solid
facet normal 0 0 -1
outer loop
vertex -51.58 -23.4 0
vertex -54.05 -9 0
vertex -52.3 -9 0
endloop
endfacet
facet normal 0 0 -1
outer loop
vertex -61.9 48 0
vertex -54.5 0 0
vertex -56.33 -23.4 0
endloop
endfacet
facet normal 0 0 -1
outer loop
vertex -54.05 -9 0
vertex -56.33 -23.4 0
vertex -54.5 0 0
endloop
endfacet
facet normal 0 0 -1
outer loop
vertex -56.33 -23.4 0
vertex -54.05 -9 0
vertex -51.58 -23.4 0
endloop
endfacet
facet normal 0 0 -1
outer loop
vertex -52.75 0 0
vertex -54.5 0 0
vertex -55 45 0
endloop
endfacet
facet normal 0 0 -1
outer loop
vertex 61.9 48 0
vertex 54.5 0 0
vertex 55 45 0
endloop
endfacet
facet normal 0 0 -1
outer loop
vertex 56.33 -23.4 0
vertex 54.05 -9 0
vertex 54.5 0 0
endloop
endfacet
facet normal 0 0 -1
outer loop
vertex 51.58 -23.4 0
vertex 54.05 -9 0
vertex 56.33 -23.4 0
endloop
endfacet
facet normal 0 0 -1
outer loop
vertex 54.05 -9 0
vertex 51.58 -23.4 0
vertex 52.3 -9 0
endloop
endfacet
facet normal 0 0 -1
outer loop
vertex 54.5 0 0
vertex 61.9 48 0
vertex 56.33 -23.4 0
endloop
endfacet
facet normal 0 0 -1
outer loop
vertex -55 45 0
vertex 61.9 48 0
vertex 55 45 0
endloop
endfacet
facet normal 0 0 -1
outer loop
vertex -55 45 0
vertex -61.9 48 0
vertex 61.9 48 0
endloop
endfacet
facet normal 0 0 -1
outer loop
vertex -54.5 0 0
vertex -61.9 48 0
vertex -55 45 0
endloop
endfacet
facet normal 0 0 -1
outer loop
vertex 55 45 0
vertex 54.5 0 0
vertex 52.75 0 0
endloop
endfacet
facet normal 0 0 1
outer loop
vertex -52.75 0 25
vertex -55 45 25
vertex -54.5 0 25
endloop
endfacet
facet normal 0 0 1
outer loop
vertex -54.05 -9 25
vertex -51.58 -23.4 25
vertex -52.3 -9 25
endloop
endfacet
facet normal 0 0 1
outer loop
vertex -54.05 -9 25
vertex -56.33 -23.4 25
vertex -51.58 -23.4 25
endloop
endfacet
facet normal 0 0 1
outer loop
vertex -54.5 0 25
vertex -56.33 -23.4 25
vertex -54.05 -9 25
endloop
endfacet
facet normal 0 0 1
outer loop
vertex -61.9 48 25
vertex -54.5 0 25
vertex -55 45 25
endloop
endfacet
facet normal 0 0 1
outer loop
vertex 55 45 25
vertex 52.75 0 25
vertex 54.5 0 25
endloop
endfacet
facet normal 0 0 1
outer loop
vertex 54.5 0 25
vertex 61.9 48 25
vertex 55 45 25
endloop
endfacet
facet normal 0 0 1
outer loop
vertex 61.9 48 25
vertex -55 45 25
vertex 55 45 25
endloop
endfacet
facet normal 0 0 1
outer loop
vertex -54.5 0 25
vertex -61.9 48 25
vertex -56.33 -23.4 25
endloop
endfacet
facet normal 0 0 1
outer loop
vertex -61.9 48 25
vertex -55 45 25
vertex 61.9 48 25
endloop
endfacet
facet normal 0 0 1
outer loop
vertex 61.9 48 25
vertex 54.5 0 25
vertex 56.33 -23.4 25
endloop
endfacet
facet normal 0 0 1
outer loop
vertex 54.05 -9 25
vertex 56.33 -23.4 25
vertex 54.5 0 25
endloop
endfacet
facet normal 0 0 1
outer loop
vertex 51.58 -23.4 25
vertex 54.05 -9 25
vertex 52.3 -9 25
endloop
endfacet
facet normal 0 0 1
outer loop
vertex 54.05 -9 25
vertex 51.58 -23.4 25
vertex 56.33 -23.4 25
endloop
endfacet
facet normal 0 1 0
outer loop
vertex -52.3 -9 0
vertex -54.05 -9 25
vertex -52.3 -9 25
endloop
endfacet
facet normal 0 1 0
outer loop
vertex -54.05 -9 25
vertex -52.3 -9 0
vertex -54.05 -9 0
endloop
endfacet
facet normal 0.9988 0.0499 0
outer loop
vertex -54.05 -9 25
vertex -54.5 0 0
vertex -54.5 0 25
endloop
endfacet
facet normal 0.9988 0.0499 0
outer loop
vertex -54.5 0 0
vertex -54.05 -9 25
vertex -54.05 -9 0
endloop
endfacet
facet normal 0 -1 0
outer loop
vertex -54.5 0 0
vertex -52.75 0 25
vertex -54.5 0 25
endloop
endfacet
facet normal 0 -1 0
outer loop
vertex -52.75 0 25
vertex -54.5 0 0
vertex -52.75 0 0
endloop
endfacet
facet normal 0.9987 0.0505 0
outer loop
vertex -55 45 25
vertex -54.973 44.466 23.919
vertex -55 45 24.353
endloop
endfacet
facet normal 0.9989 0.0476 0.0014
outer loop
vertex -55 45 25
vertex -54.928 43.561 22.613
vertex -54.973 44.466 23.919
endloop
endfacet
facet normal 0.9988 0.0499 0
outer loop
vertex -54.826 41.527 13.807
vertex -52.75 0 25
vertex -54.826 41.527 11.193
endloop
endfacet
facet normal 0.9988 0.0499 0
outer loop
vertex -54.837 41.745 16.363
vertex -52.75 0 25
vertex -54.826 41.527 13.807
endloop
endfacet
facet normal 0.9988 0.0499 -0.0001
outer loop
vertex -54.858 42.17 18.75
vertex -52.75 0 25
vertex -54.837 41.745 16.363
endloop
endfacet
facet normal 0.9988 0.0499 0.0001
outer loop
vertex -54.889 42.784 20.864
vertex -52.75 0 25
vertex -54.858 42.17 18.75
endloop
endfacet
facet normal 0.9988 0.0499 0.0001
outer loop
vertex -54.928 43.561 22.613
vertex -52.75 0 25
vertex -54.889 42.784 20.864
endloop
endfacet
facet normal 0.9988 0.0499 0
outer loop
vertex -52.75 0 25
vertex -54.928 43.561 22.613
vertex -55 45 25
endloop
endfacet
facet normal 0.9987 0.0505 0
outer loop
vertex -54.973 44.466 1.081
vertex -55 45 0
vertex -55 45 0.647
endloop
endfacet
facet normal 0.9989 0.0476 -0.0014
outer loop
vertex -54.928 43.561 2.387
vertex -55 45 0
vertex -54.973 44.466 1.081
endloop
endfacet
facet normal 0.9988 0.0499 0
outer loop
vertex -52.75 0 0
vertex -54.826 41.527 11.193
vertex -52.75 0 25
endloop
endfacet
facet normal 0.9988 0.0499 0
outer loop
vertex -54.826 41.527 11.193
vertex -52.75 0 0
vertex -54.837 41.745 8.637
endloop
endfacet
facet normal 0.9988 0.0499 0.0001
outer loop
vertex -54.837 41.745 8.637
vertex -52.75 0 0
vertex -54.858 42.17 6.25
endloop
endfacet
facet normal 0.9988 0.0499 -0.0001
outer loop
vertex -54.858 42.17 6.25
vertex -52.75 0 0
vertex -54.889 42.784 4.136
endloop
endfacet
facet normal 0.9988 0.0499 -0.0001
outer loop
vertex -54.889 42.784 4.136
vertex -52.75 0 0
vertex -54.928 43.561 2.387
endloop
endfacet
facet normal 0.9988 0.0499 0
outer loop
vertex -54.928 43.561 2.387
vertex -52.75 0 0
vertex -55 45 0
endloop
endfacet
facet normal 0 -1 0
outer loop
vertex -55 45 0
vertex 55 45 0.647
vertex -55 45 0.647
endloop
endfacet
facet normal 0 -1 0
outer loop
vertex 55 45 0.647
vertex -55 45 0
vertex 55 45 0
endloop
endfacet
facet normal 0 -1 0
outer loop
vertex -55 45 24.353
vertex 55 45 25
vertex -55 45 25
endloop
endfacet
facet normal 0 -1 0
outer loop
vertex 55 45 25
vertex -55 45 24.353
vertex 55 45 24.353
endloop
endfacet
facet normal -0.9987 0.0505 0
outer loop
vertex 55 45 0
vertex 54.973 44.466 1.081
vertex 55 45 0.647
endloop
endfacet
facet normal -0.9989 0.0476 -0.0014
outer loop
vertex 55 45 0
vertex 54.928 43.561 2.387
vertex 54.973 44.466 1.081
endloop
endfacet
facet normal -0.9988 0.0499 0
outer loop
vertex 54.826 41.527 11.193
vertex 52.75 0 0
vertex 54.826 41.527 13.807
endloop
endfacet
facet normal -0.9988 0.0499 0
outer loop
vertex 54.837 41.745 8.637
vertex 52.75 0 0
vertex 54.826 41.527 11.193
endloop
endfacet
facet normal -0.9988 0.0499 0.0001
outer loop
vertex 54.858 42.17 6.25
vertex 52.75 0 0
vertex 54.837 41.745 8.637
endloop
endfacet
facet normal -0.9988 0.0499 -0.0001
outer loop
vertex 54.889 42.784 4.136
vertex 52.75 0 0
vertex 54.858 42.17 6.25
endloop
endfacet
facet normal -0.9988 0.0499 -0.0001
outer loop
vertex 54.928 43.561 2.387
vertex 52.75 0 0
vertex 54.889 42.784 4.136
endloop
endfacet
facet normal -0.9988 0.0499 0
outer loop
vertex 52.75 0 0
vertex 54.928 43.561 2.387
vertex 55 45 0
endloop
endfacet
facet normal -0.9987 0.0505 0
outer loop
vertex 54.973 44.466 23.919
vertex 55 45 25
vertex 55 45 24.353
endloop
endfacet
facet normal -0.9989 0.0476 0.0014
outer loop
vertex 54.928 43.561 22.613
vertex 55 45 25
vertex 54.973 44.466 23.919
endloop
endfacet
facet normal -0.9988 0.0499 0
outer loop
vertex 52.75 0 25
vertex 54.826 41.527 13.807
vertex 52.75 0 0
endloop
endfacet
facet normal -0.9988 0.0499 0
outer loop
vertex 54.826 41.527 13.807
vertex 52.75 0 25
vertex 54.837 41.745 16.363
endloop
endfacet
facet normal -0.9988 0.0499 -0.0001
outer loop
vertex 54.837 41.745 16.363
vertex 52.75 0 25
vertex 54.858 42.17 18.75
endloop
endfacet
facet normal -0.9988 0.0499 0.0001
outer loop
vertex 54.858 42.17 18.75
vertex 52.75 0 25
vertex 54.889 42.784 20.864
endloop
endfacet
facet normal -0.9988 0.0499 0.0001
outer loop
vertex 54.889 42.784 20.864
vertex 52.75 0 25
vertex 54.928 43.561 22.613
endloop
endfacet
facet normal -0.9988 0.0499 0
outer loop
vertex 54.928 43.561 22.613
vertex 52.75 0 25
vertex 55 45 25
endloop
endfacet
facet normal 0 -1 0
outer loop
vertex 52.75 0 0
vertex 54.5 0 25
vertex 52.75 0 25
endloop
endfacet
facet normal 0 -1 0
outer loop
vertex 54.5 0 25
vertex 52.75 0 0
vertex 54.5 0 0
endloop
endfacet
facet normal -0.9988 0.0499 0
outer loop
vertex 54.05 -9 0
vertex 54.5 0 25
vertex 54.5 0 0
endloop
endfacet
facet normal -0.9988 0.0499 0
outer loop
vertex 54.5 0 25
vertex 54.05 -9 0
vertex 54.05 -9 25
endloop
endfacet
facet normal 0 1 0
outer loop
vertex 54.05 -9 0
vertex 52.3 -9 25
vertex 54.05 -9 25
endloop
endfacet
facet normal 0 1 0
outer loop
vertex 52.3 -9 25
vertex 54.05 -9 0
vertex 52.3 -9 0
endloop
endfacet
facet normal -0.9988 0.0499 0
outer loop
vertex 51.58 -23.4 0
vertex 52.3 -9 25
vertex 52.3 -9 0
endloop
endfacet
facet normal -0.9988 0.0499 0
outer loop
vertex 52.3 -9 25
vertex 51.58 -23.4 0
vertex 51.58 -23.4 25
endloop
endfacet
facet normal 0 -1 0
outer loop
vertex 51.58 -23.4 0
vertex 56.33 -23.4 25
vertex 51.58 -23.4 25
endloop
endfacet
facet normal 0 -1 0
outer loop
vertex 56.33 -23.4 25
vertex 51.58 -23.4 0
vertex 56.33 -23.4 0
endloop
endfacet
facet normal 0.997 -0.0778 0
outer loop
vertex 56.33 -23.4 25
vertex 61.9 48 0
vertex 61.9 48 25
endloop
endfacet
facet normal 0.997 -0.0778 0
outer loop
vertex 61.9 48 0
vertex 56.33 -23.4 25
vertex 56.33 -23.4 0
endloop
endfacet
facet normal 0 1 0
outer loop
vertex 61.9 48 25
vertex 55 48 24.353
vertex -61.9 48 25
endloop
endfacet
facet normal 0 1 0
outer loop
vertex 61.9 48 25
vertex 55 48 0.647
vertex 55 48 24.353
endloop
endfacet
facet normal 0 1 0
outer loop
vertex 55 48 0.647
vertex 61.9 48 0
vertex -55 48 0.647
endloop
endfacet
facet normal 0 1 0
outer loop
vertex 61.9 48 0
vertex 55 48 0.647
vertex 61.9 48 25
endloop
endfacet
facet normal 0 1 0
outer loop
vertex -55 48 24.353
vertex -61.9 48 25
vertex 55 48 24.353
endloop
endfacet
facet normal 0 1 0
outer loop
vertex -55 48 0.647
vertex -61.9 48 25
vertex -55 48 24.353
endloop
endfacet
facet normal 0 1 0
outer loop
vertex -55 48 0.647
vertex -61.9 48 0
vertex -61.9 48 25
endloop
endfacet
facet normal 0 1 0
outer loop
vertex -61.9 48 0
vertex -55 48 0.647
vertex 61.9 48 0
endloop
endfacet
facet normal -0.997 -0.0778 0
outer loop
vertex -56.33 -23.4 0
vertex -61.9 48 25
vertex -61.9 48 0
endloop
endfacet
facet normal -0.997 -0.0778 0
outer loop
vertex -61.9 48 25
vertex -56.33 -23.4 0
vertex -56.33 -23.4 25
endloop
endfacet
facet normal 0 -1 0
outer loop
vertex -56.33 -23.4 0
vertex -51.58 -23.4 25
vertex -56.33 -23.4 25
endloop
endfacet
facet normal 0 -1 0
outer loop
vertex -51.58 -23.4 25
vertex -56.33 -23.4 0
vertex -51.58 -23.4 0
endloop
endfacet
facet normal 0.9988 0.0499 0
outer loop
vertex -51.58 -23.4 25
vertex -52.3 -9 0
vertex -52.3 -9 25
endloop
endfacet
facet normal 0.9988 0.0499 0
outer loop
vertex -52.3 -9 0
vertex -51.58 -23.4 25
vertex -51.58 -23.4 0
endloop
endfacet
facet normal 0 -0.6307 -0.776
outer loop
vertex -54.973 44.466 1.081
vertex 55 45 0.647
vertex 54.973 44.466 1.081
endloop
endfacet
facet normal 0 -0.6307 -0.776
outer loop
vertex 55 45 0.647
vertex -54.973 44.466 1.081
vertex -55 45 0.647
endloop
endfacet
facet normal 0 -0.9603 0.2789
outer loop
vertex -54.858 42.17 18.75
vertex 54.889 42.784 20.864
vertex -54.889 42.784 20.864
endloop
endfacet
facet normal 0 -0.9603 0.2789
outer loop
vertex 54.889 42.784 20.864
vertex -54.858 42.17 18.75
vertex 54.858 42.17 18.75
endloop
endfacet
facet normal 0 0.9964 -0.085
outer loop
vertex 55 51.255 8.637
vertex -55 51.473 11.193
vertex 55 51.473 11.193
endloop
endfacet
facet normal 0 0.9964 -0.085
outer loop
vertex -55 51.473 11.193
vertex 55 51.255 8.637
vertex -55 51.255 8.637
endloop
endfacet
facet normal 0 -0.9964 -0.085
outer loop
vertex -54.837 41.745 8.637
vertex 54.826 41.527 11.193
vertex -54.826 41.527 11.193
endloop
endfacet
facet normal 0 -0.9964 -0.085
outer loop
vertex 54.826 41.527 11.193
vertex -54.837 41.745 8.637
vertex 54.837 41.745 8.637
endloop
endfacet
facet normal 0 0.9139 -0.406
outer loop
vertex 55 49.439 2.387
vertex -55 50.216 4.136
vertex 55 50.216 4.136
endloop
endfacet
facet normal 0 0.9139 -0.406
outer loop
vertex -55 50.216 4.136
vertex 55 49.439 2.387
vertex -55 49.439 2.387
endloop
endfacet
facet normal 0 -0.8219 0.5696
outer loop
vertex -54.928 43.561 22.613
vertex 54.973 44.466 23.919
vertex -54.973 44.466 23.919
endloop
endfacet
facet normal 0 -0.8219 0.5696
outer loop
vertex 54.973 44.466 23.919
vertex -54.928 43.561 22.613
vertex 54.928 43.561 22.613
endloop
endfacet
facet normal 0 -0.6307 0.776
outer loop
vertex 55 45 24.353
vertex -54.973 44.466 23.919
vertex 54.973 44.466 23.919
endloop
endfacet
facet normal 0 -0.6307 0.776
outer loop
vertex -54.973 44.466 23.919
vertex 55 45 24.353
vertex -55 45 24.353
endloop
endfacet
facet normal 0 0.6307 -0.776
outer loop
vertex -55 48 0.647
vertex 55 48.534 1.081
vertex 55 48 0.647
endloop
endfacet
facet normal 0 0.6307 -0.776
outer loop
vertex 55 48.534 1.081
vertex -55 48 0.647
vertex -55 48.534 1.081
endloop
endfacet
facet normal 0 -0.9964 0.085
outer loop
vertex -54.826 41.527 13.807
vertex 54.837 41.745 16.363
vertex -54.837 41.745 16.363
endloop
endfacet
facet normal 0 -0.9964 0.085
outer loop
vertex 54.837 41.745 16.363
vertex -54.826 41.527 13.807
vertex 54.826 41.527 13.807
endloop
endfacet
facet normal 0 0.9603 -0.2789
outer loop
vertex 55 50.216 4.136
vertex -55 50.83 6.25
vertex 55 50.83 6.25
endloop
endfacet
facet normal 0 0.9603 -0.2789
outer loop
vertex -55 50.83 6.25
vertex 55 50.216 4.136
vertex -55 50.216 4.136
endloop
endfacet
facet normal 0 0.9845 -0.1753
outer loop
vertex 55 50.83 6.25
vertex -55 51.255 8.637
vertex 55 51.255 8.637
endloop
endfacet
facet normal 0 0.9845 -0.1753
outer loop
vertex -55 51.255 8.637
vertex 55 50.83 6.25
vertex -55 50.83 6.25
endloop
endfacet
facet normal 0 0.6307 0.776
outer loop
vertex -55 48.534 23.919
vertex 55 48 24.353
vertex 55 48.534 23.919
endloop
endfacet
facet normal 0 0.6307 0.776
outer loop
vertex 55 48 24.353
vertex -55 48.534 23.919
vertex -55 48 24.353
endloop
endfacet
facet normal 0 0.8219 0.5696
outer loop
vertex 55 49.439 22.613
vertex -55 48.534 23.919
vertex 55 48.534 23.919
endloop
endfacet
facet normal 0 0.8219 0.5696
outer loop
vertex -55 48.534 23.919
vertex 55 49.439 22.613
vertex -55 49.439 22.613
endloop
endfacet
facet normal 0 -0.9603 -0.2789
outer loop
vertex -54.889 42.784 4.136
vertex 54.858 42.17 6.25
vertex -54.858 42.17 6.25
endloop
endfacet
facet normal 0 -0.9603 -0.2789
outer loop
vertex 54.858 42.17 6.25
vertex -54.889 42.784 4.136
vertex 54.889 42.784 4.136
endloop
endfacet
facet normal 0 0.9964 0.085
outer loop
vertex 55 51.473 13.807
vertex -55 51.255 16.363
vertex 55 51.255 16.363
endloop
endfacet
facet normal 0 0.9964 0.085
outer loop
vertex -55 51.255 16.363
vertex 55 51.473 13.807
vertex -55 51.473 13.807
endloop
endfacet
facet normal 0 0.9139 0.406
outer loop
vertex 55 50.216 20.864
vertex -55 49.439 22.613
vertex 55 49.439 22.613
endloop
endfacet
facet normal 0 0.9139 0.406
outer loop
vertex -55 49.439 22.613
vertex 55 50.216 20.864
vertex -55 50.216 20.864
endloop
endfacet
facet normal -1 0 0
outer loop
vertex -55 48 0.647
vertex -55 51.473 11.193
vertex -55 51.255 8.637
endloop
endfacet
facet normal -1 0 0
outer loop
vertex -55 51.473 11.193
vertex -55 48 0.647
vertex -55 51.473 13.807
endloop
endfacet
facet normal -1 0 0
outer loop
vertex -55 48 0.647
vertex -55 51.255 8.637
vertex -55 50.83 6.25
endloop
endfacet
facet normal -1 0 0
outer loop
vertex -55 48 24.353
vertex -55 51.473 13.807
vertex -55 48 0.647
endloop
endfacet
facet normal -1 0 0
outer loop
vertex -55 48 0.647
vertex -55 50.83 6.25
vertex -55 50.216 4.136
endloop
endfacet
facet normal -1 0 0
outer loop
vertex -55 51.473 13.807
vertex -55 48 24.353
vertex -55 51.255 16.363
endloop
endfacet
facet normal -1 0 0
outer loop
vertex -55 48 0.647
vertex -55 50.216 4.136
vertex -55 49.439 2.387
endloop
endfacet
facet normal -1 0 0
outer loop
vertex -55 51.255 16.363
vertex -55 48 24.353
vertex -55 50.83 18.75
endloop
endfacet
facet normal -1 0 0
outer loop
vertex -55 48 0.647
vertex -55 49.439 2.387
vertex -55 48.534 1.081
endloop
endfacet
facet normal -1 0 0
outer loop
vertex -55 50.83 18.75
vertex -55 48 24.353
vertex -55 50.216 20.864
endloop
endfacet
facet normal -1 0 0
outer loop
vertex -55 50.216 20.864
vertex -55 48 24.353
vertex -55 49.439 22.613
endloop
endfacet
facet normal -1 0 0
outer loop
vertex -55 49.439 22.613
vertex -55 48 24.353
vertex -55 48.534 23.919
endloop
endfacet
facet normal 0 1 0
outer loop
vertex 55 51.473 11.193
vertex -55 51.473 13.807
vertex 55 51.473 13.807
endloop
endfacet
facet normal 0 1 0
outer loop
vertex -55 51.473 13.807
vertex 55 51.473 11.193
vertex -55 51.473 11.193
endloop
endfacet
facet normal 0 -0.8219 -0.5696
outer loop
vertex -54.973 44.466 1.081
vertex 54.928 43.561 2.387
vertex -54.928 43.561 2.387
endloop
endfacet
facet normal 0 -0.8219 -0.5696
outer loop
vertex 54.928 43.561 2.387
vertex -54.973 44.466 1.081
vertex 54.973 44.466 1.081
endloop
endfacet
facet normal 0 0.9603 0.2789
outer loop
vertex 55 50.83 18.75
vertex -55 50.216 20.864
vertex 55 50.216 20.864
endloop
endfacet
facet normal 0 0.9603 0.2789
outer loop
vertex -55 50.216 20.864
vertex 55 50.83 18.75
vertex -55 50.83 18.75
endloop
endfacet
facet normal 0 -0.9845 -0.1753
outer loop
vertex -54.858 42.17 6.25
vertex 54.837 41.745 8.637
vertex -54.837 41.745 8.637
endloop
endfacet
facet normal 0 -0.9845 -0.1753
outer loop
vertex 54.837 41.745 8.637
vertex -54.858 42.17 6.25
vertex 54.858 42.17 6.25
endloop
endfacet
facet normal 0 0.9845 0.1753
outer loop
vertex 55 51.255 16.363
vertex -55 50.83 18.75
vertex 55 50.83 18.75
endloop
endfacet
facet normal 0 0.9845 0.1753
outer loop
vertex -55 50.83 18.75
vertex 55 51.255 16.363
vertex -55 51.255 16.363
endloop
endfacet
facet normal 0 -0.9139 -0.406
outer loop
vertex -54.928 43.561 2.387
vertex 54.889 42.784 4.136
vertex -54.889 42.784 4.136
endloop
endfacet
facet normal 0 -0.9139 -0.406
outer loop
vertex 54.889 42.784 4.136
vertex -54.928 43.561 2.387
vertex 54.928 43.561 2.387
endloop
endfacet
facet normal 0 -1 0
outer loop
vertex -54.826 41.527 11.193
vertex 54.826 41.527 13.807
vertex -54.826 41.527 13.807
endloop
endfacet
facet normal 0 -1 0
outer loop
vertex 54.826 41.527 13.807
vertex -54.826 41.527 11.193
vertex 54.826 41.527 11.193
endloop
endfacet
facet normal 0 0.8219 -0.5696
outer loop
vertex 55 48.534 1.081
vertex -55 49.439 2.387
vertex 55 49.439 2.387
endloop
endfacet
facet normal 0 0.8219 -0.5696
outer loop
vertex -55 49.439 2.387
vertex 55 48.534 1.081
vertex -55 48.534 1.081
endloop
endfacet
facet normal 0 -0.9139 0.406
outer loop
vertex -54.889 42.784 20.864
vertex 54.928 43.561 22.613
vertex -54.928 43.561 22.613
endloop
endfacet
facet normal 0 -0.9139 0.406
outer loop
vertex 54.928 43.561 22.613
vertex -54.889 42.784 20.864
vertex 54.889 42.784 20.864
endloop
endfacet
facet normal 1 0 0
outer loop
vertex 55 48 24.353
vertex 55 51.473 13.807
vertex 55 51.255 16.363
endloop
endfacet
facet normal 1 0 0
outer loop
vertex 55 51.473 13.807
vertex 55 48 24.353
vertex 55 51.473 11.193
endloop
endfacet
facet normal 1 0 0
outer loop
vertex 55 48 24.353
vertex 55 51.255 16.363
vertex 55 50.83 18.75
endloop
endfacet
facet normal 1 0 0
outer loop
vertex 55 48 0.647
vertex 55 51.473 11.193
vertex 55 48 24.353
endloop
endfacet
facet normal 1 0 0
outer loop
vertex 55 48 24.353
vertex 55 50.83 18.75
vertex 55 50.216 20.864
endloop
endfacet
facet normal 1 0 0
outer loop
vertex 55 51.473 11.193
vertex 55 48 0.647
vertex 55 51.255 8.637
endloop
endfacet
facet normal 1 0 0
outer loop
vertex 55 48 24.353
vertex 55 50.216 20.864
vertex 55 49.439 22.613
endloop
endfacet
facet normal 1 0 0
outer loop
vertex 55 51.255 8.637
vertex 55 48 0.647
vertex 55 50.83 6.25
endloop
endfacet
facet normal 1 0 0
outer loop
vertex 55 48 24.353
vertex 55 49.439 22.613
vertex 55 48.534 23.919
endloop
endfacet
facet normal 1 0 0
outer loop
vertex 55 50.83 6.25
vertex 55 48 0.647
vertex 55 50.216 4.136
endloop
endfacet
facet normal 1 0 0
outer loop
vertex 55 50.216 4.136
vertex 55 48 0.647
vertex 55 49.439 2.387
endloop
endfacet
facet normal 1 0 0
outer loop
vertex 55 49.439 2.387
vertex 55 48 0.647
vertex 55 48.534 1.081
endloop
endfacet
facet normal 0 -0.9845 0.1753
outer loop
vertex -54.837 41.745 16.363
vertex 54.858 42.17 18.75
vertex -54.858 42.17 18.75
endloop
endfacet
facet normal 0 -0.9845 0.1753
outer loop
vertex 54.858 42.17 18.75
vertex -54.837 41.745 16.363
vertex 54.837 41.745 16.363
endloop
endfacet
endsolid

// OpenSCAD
side_inner = 110;  side_outer = 113.5;
side_in_rad = side_inner / 2;  side_out_rad = side_outer / 2;
clearance = 20;
// 'width' = X, 'height/depth' = Y, 'up' = Z
side_in_height = 14.4; side_out_height = 10;  top_out_height = 9;
side_depth = side_in_height + top_out_height;

side_low_thick = 3;  side_top_thick = 5; 
handle_mid_thick = 3;  handle_end_thick = 5;
handle_height = 25 + clearance;  handle_up = 25;

function pinch_n(n, m, o, s) = n + (m-o)*s*(n==0?1:n/abs(n));

function pinch_vec(points, origin, slope) = [
    for(point = points)
    [pinch_n(point.x, point.y, origin.y, slope.x), pinch_n(point.y, point.x, origin.x, slope.y)]
];

// Designed to be centred.  Easier calculations?  More obvious?
handle_pts = [
    // Inside right
    [side_in_rad, -side_depth],
    [side_in_rad, -side_depth+side_in_height], [side_out_rad, -side_depth+side_in_height],
    [side_out_rad, 0], [side_in_rad, 0], [side_in_rad, handle_height],
    // Mid, under handle
    [0, handle_height],
    // Inside left
    [-side_in_rad, handle_height], [-side_in_rad, 0], [-side_out_rad, 0],
    [-side_out_rad, -side_depth+side_in_height], [-side_in_rad, -side_depth+side_in_height],
    [-side_in_rad, -side_depth],
    // Outside left
    [-side_out_rad-side_low_thick, -side_depth],
    [-side_out_rad-handle_end_thick, handle_height+handle_mid_thick],
    // Mid, over handle
    [0, handle_height+handle_mid_thick],
    // Back to the outside right
    [side_out_rad+handle_end_thick, handle_height+handle_mid_thick],
    [side_out_rad+side_low_thick, -side_depth]
];

linear_extrude(handle_up) {
    polygon(pinch_vec(handle_pts, [0, handle_height], [0.05, 0]));
}

translate([0, handle_height+handle_mid_thick/2, handle_up/2]) scale([1, 0.4, 1]) 
  rotate([0, 90, 0]) cylinder(h=side_inner, d=handle_up, center=true);
